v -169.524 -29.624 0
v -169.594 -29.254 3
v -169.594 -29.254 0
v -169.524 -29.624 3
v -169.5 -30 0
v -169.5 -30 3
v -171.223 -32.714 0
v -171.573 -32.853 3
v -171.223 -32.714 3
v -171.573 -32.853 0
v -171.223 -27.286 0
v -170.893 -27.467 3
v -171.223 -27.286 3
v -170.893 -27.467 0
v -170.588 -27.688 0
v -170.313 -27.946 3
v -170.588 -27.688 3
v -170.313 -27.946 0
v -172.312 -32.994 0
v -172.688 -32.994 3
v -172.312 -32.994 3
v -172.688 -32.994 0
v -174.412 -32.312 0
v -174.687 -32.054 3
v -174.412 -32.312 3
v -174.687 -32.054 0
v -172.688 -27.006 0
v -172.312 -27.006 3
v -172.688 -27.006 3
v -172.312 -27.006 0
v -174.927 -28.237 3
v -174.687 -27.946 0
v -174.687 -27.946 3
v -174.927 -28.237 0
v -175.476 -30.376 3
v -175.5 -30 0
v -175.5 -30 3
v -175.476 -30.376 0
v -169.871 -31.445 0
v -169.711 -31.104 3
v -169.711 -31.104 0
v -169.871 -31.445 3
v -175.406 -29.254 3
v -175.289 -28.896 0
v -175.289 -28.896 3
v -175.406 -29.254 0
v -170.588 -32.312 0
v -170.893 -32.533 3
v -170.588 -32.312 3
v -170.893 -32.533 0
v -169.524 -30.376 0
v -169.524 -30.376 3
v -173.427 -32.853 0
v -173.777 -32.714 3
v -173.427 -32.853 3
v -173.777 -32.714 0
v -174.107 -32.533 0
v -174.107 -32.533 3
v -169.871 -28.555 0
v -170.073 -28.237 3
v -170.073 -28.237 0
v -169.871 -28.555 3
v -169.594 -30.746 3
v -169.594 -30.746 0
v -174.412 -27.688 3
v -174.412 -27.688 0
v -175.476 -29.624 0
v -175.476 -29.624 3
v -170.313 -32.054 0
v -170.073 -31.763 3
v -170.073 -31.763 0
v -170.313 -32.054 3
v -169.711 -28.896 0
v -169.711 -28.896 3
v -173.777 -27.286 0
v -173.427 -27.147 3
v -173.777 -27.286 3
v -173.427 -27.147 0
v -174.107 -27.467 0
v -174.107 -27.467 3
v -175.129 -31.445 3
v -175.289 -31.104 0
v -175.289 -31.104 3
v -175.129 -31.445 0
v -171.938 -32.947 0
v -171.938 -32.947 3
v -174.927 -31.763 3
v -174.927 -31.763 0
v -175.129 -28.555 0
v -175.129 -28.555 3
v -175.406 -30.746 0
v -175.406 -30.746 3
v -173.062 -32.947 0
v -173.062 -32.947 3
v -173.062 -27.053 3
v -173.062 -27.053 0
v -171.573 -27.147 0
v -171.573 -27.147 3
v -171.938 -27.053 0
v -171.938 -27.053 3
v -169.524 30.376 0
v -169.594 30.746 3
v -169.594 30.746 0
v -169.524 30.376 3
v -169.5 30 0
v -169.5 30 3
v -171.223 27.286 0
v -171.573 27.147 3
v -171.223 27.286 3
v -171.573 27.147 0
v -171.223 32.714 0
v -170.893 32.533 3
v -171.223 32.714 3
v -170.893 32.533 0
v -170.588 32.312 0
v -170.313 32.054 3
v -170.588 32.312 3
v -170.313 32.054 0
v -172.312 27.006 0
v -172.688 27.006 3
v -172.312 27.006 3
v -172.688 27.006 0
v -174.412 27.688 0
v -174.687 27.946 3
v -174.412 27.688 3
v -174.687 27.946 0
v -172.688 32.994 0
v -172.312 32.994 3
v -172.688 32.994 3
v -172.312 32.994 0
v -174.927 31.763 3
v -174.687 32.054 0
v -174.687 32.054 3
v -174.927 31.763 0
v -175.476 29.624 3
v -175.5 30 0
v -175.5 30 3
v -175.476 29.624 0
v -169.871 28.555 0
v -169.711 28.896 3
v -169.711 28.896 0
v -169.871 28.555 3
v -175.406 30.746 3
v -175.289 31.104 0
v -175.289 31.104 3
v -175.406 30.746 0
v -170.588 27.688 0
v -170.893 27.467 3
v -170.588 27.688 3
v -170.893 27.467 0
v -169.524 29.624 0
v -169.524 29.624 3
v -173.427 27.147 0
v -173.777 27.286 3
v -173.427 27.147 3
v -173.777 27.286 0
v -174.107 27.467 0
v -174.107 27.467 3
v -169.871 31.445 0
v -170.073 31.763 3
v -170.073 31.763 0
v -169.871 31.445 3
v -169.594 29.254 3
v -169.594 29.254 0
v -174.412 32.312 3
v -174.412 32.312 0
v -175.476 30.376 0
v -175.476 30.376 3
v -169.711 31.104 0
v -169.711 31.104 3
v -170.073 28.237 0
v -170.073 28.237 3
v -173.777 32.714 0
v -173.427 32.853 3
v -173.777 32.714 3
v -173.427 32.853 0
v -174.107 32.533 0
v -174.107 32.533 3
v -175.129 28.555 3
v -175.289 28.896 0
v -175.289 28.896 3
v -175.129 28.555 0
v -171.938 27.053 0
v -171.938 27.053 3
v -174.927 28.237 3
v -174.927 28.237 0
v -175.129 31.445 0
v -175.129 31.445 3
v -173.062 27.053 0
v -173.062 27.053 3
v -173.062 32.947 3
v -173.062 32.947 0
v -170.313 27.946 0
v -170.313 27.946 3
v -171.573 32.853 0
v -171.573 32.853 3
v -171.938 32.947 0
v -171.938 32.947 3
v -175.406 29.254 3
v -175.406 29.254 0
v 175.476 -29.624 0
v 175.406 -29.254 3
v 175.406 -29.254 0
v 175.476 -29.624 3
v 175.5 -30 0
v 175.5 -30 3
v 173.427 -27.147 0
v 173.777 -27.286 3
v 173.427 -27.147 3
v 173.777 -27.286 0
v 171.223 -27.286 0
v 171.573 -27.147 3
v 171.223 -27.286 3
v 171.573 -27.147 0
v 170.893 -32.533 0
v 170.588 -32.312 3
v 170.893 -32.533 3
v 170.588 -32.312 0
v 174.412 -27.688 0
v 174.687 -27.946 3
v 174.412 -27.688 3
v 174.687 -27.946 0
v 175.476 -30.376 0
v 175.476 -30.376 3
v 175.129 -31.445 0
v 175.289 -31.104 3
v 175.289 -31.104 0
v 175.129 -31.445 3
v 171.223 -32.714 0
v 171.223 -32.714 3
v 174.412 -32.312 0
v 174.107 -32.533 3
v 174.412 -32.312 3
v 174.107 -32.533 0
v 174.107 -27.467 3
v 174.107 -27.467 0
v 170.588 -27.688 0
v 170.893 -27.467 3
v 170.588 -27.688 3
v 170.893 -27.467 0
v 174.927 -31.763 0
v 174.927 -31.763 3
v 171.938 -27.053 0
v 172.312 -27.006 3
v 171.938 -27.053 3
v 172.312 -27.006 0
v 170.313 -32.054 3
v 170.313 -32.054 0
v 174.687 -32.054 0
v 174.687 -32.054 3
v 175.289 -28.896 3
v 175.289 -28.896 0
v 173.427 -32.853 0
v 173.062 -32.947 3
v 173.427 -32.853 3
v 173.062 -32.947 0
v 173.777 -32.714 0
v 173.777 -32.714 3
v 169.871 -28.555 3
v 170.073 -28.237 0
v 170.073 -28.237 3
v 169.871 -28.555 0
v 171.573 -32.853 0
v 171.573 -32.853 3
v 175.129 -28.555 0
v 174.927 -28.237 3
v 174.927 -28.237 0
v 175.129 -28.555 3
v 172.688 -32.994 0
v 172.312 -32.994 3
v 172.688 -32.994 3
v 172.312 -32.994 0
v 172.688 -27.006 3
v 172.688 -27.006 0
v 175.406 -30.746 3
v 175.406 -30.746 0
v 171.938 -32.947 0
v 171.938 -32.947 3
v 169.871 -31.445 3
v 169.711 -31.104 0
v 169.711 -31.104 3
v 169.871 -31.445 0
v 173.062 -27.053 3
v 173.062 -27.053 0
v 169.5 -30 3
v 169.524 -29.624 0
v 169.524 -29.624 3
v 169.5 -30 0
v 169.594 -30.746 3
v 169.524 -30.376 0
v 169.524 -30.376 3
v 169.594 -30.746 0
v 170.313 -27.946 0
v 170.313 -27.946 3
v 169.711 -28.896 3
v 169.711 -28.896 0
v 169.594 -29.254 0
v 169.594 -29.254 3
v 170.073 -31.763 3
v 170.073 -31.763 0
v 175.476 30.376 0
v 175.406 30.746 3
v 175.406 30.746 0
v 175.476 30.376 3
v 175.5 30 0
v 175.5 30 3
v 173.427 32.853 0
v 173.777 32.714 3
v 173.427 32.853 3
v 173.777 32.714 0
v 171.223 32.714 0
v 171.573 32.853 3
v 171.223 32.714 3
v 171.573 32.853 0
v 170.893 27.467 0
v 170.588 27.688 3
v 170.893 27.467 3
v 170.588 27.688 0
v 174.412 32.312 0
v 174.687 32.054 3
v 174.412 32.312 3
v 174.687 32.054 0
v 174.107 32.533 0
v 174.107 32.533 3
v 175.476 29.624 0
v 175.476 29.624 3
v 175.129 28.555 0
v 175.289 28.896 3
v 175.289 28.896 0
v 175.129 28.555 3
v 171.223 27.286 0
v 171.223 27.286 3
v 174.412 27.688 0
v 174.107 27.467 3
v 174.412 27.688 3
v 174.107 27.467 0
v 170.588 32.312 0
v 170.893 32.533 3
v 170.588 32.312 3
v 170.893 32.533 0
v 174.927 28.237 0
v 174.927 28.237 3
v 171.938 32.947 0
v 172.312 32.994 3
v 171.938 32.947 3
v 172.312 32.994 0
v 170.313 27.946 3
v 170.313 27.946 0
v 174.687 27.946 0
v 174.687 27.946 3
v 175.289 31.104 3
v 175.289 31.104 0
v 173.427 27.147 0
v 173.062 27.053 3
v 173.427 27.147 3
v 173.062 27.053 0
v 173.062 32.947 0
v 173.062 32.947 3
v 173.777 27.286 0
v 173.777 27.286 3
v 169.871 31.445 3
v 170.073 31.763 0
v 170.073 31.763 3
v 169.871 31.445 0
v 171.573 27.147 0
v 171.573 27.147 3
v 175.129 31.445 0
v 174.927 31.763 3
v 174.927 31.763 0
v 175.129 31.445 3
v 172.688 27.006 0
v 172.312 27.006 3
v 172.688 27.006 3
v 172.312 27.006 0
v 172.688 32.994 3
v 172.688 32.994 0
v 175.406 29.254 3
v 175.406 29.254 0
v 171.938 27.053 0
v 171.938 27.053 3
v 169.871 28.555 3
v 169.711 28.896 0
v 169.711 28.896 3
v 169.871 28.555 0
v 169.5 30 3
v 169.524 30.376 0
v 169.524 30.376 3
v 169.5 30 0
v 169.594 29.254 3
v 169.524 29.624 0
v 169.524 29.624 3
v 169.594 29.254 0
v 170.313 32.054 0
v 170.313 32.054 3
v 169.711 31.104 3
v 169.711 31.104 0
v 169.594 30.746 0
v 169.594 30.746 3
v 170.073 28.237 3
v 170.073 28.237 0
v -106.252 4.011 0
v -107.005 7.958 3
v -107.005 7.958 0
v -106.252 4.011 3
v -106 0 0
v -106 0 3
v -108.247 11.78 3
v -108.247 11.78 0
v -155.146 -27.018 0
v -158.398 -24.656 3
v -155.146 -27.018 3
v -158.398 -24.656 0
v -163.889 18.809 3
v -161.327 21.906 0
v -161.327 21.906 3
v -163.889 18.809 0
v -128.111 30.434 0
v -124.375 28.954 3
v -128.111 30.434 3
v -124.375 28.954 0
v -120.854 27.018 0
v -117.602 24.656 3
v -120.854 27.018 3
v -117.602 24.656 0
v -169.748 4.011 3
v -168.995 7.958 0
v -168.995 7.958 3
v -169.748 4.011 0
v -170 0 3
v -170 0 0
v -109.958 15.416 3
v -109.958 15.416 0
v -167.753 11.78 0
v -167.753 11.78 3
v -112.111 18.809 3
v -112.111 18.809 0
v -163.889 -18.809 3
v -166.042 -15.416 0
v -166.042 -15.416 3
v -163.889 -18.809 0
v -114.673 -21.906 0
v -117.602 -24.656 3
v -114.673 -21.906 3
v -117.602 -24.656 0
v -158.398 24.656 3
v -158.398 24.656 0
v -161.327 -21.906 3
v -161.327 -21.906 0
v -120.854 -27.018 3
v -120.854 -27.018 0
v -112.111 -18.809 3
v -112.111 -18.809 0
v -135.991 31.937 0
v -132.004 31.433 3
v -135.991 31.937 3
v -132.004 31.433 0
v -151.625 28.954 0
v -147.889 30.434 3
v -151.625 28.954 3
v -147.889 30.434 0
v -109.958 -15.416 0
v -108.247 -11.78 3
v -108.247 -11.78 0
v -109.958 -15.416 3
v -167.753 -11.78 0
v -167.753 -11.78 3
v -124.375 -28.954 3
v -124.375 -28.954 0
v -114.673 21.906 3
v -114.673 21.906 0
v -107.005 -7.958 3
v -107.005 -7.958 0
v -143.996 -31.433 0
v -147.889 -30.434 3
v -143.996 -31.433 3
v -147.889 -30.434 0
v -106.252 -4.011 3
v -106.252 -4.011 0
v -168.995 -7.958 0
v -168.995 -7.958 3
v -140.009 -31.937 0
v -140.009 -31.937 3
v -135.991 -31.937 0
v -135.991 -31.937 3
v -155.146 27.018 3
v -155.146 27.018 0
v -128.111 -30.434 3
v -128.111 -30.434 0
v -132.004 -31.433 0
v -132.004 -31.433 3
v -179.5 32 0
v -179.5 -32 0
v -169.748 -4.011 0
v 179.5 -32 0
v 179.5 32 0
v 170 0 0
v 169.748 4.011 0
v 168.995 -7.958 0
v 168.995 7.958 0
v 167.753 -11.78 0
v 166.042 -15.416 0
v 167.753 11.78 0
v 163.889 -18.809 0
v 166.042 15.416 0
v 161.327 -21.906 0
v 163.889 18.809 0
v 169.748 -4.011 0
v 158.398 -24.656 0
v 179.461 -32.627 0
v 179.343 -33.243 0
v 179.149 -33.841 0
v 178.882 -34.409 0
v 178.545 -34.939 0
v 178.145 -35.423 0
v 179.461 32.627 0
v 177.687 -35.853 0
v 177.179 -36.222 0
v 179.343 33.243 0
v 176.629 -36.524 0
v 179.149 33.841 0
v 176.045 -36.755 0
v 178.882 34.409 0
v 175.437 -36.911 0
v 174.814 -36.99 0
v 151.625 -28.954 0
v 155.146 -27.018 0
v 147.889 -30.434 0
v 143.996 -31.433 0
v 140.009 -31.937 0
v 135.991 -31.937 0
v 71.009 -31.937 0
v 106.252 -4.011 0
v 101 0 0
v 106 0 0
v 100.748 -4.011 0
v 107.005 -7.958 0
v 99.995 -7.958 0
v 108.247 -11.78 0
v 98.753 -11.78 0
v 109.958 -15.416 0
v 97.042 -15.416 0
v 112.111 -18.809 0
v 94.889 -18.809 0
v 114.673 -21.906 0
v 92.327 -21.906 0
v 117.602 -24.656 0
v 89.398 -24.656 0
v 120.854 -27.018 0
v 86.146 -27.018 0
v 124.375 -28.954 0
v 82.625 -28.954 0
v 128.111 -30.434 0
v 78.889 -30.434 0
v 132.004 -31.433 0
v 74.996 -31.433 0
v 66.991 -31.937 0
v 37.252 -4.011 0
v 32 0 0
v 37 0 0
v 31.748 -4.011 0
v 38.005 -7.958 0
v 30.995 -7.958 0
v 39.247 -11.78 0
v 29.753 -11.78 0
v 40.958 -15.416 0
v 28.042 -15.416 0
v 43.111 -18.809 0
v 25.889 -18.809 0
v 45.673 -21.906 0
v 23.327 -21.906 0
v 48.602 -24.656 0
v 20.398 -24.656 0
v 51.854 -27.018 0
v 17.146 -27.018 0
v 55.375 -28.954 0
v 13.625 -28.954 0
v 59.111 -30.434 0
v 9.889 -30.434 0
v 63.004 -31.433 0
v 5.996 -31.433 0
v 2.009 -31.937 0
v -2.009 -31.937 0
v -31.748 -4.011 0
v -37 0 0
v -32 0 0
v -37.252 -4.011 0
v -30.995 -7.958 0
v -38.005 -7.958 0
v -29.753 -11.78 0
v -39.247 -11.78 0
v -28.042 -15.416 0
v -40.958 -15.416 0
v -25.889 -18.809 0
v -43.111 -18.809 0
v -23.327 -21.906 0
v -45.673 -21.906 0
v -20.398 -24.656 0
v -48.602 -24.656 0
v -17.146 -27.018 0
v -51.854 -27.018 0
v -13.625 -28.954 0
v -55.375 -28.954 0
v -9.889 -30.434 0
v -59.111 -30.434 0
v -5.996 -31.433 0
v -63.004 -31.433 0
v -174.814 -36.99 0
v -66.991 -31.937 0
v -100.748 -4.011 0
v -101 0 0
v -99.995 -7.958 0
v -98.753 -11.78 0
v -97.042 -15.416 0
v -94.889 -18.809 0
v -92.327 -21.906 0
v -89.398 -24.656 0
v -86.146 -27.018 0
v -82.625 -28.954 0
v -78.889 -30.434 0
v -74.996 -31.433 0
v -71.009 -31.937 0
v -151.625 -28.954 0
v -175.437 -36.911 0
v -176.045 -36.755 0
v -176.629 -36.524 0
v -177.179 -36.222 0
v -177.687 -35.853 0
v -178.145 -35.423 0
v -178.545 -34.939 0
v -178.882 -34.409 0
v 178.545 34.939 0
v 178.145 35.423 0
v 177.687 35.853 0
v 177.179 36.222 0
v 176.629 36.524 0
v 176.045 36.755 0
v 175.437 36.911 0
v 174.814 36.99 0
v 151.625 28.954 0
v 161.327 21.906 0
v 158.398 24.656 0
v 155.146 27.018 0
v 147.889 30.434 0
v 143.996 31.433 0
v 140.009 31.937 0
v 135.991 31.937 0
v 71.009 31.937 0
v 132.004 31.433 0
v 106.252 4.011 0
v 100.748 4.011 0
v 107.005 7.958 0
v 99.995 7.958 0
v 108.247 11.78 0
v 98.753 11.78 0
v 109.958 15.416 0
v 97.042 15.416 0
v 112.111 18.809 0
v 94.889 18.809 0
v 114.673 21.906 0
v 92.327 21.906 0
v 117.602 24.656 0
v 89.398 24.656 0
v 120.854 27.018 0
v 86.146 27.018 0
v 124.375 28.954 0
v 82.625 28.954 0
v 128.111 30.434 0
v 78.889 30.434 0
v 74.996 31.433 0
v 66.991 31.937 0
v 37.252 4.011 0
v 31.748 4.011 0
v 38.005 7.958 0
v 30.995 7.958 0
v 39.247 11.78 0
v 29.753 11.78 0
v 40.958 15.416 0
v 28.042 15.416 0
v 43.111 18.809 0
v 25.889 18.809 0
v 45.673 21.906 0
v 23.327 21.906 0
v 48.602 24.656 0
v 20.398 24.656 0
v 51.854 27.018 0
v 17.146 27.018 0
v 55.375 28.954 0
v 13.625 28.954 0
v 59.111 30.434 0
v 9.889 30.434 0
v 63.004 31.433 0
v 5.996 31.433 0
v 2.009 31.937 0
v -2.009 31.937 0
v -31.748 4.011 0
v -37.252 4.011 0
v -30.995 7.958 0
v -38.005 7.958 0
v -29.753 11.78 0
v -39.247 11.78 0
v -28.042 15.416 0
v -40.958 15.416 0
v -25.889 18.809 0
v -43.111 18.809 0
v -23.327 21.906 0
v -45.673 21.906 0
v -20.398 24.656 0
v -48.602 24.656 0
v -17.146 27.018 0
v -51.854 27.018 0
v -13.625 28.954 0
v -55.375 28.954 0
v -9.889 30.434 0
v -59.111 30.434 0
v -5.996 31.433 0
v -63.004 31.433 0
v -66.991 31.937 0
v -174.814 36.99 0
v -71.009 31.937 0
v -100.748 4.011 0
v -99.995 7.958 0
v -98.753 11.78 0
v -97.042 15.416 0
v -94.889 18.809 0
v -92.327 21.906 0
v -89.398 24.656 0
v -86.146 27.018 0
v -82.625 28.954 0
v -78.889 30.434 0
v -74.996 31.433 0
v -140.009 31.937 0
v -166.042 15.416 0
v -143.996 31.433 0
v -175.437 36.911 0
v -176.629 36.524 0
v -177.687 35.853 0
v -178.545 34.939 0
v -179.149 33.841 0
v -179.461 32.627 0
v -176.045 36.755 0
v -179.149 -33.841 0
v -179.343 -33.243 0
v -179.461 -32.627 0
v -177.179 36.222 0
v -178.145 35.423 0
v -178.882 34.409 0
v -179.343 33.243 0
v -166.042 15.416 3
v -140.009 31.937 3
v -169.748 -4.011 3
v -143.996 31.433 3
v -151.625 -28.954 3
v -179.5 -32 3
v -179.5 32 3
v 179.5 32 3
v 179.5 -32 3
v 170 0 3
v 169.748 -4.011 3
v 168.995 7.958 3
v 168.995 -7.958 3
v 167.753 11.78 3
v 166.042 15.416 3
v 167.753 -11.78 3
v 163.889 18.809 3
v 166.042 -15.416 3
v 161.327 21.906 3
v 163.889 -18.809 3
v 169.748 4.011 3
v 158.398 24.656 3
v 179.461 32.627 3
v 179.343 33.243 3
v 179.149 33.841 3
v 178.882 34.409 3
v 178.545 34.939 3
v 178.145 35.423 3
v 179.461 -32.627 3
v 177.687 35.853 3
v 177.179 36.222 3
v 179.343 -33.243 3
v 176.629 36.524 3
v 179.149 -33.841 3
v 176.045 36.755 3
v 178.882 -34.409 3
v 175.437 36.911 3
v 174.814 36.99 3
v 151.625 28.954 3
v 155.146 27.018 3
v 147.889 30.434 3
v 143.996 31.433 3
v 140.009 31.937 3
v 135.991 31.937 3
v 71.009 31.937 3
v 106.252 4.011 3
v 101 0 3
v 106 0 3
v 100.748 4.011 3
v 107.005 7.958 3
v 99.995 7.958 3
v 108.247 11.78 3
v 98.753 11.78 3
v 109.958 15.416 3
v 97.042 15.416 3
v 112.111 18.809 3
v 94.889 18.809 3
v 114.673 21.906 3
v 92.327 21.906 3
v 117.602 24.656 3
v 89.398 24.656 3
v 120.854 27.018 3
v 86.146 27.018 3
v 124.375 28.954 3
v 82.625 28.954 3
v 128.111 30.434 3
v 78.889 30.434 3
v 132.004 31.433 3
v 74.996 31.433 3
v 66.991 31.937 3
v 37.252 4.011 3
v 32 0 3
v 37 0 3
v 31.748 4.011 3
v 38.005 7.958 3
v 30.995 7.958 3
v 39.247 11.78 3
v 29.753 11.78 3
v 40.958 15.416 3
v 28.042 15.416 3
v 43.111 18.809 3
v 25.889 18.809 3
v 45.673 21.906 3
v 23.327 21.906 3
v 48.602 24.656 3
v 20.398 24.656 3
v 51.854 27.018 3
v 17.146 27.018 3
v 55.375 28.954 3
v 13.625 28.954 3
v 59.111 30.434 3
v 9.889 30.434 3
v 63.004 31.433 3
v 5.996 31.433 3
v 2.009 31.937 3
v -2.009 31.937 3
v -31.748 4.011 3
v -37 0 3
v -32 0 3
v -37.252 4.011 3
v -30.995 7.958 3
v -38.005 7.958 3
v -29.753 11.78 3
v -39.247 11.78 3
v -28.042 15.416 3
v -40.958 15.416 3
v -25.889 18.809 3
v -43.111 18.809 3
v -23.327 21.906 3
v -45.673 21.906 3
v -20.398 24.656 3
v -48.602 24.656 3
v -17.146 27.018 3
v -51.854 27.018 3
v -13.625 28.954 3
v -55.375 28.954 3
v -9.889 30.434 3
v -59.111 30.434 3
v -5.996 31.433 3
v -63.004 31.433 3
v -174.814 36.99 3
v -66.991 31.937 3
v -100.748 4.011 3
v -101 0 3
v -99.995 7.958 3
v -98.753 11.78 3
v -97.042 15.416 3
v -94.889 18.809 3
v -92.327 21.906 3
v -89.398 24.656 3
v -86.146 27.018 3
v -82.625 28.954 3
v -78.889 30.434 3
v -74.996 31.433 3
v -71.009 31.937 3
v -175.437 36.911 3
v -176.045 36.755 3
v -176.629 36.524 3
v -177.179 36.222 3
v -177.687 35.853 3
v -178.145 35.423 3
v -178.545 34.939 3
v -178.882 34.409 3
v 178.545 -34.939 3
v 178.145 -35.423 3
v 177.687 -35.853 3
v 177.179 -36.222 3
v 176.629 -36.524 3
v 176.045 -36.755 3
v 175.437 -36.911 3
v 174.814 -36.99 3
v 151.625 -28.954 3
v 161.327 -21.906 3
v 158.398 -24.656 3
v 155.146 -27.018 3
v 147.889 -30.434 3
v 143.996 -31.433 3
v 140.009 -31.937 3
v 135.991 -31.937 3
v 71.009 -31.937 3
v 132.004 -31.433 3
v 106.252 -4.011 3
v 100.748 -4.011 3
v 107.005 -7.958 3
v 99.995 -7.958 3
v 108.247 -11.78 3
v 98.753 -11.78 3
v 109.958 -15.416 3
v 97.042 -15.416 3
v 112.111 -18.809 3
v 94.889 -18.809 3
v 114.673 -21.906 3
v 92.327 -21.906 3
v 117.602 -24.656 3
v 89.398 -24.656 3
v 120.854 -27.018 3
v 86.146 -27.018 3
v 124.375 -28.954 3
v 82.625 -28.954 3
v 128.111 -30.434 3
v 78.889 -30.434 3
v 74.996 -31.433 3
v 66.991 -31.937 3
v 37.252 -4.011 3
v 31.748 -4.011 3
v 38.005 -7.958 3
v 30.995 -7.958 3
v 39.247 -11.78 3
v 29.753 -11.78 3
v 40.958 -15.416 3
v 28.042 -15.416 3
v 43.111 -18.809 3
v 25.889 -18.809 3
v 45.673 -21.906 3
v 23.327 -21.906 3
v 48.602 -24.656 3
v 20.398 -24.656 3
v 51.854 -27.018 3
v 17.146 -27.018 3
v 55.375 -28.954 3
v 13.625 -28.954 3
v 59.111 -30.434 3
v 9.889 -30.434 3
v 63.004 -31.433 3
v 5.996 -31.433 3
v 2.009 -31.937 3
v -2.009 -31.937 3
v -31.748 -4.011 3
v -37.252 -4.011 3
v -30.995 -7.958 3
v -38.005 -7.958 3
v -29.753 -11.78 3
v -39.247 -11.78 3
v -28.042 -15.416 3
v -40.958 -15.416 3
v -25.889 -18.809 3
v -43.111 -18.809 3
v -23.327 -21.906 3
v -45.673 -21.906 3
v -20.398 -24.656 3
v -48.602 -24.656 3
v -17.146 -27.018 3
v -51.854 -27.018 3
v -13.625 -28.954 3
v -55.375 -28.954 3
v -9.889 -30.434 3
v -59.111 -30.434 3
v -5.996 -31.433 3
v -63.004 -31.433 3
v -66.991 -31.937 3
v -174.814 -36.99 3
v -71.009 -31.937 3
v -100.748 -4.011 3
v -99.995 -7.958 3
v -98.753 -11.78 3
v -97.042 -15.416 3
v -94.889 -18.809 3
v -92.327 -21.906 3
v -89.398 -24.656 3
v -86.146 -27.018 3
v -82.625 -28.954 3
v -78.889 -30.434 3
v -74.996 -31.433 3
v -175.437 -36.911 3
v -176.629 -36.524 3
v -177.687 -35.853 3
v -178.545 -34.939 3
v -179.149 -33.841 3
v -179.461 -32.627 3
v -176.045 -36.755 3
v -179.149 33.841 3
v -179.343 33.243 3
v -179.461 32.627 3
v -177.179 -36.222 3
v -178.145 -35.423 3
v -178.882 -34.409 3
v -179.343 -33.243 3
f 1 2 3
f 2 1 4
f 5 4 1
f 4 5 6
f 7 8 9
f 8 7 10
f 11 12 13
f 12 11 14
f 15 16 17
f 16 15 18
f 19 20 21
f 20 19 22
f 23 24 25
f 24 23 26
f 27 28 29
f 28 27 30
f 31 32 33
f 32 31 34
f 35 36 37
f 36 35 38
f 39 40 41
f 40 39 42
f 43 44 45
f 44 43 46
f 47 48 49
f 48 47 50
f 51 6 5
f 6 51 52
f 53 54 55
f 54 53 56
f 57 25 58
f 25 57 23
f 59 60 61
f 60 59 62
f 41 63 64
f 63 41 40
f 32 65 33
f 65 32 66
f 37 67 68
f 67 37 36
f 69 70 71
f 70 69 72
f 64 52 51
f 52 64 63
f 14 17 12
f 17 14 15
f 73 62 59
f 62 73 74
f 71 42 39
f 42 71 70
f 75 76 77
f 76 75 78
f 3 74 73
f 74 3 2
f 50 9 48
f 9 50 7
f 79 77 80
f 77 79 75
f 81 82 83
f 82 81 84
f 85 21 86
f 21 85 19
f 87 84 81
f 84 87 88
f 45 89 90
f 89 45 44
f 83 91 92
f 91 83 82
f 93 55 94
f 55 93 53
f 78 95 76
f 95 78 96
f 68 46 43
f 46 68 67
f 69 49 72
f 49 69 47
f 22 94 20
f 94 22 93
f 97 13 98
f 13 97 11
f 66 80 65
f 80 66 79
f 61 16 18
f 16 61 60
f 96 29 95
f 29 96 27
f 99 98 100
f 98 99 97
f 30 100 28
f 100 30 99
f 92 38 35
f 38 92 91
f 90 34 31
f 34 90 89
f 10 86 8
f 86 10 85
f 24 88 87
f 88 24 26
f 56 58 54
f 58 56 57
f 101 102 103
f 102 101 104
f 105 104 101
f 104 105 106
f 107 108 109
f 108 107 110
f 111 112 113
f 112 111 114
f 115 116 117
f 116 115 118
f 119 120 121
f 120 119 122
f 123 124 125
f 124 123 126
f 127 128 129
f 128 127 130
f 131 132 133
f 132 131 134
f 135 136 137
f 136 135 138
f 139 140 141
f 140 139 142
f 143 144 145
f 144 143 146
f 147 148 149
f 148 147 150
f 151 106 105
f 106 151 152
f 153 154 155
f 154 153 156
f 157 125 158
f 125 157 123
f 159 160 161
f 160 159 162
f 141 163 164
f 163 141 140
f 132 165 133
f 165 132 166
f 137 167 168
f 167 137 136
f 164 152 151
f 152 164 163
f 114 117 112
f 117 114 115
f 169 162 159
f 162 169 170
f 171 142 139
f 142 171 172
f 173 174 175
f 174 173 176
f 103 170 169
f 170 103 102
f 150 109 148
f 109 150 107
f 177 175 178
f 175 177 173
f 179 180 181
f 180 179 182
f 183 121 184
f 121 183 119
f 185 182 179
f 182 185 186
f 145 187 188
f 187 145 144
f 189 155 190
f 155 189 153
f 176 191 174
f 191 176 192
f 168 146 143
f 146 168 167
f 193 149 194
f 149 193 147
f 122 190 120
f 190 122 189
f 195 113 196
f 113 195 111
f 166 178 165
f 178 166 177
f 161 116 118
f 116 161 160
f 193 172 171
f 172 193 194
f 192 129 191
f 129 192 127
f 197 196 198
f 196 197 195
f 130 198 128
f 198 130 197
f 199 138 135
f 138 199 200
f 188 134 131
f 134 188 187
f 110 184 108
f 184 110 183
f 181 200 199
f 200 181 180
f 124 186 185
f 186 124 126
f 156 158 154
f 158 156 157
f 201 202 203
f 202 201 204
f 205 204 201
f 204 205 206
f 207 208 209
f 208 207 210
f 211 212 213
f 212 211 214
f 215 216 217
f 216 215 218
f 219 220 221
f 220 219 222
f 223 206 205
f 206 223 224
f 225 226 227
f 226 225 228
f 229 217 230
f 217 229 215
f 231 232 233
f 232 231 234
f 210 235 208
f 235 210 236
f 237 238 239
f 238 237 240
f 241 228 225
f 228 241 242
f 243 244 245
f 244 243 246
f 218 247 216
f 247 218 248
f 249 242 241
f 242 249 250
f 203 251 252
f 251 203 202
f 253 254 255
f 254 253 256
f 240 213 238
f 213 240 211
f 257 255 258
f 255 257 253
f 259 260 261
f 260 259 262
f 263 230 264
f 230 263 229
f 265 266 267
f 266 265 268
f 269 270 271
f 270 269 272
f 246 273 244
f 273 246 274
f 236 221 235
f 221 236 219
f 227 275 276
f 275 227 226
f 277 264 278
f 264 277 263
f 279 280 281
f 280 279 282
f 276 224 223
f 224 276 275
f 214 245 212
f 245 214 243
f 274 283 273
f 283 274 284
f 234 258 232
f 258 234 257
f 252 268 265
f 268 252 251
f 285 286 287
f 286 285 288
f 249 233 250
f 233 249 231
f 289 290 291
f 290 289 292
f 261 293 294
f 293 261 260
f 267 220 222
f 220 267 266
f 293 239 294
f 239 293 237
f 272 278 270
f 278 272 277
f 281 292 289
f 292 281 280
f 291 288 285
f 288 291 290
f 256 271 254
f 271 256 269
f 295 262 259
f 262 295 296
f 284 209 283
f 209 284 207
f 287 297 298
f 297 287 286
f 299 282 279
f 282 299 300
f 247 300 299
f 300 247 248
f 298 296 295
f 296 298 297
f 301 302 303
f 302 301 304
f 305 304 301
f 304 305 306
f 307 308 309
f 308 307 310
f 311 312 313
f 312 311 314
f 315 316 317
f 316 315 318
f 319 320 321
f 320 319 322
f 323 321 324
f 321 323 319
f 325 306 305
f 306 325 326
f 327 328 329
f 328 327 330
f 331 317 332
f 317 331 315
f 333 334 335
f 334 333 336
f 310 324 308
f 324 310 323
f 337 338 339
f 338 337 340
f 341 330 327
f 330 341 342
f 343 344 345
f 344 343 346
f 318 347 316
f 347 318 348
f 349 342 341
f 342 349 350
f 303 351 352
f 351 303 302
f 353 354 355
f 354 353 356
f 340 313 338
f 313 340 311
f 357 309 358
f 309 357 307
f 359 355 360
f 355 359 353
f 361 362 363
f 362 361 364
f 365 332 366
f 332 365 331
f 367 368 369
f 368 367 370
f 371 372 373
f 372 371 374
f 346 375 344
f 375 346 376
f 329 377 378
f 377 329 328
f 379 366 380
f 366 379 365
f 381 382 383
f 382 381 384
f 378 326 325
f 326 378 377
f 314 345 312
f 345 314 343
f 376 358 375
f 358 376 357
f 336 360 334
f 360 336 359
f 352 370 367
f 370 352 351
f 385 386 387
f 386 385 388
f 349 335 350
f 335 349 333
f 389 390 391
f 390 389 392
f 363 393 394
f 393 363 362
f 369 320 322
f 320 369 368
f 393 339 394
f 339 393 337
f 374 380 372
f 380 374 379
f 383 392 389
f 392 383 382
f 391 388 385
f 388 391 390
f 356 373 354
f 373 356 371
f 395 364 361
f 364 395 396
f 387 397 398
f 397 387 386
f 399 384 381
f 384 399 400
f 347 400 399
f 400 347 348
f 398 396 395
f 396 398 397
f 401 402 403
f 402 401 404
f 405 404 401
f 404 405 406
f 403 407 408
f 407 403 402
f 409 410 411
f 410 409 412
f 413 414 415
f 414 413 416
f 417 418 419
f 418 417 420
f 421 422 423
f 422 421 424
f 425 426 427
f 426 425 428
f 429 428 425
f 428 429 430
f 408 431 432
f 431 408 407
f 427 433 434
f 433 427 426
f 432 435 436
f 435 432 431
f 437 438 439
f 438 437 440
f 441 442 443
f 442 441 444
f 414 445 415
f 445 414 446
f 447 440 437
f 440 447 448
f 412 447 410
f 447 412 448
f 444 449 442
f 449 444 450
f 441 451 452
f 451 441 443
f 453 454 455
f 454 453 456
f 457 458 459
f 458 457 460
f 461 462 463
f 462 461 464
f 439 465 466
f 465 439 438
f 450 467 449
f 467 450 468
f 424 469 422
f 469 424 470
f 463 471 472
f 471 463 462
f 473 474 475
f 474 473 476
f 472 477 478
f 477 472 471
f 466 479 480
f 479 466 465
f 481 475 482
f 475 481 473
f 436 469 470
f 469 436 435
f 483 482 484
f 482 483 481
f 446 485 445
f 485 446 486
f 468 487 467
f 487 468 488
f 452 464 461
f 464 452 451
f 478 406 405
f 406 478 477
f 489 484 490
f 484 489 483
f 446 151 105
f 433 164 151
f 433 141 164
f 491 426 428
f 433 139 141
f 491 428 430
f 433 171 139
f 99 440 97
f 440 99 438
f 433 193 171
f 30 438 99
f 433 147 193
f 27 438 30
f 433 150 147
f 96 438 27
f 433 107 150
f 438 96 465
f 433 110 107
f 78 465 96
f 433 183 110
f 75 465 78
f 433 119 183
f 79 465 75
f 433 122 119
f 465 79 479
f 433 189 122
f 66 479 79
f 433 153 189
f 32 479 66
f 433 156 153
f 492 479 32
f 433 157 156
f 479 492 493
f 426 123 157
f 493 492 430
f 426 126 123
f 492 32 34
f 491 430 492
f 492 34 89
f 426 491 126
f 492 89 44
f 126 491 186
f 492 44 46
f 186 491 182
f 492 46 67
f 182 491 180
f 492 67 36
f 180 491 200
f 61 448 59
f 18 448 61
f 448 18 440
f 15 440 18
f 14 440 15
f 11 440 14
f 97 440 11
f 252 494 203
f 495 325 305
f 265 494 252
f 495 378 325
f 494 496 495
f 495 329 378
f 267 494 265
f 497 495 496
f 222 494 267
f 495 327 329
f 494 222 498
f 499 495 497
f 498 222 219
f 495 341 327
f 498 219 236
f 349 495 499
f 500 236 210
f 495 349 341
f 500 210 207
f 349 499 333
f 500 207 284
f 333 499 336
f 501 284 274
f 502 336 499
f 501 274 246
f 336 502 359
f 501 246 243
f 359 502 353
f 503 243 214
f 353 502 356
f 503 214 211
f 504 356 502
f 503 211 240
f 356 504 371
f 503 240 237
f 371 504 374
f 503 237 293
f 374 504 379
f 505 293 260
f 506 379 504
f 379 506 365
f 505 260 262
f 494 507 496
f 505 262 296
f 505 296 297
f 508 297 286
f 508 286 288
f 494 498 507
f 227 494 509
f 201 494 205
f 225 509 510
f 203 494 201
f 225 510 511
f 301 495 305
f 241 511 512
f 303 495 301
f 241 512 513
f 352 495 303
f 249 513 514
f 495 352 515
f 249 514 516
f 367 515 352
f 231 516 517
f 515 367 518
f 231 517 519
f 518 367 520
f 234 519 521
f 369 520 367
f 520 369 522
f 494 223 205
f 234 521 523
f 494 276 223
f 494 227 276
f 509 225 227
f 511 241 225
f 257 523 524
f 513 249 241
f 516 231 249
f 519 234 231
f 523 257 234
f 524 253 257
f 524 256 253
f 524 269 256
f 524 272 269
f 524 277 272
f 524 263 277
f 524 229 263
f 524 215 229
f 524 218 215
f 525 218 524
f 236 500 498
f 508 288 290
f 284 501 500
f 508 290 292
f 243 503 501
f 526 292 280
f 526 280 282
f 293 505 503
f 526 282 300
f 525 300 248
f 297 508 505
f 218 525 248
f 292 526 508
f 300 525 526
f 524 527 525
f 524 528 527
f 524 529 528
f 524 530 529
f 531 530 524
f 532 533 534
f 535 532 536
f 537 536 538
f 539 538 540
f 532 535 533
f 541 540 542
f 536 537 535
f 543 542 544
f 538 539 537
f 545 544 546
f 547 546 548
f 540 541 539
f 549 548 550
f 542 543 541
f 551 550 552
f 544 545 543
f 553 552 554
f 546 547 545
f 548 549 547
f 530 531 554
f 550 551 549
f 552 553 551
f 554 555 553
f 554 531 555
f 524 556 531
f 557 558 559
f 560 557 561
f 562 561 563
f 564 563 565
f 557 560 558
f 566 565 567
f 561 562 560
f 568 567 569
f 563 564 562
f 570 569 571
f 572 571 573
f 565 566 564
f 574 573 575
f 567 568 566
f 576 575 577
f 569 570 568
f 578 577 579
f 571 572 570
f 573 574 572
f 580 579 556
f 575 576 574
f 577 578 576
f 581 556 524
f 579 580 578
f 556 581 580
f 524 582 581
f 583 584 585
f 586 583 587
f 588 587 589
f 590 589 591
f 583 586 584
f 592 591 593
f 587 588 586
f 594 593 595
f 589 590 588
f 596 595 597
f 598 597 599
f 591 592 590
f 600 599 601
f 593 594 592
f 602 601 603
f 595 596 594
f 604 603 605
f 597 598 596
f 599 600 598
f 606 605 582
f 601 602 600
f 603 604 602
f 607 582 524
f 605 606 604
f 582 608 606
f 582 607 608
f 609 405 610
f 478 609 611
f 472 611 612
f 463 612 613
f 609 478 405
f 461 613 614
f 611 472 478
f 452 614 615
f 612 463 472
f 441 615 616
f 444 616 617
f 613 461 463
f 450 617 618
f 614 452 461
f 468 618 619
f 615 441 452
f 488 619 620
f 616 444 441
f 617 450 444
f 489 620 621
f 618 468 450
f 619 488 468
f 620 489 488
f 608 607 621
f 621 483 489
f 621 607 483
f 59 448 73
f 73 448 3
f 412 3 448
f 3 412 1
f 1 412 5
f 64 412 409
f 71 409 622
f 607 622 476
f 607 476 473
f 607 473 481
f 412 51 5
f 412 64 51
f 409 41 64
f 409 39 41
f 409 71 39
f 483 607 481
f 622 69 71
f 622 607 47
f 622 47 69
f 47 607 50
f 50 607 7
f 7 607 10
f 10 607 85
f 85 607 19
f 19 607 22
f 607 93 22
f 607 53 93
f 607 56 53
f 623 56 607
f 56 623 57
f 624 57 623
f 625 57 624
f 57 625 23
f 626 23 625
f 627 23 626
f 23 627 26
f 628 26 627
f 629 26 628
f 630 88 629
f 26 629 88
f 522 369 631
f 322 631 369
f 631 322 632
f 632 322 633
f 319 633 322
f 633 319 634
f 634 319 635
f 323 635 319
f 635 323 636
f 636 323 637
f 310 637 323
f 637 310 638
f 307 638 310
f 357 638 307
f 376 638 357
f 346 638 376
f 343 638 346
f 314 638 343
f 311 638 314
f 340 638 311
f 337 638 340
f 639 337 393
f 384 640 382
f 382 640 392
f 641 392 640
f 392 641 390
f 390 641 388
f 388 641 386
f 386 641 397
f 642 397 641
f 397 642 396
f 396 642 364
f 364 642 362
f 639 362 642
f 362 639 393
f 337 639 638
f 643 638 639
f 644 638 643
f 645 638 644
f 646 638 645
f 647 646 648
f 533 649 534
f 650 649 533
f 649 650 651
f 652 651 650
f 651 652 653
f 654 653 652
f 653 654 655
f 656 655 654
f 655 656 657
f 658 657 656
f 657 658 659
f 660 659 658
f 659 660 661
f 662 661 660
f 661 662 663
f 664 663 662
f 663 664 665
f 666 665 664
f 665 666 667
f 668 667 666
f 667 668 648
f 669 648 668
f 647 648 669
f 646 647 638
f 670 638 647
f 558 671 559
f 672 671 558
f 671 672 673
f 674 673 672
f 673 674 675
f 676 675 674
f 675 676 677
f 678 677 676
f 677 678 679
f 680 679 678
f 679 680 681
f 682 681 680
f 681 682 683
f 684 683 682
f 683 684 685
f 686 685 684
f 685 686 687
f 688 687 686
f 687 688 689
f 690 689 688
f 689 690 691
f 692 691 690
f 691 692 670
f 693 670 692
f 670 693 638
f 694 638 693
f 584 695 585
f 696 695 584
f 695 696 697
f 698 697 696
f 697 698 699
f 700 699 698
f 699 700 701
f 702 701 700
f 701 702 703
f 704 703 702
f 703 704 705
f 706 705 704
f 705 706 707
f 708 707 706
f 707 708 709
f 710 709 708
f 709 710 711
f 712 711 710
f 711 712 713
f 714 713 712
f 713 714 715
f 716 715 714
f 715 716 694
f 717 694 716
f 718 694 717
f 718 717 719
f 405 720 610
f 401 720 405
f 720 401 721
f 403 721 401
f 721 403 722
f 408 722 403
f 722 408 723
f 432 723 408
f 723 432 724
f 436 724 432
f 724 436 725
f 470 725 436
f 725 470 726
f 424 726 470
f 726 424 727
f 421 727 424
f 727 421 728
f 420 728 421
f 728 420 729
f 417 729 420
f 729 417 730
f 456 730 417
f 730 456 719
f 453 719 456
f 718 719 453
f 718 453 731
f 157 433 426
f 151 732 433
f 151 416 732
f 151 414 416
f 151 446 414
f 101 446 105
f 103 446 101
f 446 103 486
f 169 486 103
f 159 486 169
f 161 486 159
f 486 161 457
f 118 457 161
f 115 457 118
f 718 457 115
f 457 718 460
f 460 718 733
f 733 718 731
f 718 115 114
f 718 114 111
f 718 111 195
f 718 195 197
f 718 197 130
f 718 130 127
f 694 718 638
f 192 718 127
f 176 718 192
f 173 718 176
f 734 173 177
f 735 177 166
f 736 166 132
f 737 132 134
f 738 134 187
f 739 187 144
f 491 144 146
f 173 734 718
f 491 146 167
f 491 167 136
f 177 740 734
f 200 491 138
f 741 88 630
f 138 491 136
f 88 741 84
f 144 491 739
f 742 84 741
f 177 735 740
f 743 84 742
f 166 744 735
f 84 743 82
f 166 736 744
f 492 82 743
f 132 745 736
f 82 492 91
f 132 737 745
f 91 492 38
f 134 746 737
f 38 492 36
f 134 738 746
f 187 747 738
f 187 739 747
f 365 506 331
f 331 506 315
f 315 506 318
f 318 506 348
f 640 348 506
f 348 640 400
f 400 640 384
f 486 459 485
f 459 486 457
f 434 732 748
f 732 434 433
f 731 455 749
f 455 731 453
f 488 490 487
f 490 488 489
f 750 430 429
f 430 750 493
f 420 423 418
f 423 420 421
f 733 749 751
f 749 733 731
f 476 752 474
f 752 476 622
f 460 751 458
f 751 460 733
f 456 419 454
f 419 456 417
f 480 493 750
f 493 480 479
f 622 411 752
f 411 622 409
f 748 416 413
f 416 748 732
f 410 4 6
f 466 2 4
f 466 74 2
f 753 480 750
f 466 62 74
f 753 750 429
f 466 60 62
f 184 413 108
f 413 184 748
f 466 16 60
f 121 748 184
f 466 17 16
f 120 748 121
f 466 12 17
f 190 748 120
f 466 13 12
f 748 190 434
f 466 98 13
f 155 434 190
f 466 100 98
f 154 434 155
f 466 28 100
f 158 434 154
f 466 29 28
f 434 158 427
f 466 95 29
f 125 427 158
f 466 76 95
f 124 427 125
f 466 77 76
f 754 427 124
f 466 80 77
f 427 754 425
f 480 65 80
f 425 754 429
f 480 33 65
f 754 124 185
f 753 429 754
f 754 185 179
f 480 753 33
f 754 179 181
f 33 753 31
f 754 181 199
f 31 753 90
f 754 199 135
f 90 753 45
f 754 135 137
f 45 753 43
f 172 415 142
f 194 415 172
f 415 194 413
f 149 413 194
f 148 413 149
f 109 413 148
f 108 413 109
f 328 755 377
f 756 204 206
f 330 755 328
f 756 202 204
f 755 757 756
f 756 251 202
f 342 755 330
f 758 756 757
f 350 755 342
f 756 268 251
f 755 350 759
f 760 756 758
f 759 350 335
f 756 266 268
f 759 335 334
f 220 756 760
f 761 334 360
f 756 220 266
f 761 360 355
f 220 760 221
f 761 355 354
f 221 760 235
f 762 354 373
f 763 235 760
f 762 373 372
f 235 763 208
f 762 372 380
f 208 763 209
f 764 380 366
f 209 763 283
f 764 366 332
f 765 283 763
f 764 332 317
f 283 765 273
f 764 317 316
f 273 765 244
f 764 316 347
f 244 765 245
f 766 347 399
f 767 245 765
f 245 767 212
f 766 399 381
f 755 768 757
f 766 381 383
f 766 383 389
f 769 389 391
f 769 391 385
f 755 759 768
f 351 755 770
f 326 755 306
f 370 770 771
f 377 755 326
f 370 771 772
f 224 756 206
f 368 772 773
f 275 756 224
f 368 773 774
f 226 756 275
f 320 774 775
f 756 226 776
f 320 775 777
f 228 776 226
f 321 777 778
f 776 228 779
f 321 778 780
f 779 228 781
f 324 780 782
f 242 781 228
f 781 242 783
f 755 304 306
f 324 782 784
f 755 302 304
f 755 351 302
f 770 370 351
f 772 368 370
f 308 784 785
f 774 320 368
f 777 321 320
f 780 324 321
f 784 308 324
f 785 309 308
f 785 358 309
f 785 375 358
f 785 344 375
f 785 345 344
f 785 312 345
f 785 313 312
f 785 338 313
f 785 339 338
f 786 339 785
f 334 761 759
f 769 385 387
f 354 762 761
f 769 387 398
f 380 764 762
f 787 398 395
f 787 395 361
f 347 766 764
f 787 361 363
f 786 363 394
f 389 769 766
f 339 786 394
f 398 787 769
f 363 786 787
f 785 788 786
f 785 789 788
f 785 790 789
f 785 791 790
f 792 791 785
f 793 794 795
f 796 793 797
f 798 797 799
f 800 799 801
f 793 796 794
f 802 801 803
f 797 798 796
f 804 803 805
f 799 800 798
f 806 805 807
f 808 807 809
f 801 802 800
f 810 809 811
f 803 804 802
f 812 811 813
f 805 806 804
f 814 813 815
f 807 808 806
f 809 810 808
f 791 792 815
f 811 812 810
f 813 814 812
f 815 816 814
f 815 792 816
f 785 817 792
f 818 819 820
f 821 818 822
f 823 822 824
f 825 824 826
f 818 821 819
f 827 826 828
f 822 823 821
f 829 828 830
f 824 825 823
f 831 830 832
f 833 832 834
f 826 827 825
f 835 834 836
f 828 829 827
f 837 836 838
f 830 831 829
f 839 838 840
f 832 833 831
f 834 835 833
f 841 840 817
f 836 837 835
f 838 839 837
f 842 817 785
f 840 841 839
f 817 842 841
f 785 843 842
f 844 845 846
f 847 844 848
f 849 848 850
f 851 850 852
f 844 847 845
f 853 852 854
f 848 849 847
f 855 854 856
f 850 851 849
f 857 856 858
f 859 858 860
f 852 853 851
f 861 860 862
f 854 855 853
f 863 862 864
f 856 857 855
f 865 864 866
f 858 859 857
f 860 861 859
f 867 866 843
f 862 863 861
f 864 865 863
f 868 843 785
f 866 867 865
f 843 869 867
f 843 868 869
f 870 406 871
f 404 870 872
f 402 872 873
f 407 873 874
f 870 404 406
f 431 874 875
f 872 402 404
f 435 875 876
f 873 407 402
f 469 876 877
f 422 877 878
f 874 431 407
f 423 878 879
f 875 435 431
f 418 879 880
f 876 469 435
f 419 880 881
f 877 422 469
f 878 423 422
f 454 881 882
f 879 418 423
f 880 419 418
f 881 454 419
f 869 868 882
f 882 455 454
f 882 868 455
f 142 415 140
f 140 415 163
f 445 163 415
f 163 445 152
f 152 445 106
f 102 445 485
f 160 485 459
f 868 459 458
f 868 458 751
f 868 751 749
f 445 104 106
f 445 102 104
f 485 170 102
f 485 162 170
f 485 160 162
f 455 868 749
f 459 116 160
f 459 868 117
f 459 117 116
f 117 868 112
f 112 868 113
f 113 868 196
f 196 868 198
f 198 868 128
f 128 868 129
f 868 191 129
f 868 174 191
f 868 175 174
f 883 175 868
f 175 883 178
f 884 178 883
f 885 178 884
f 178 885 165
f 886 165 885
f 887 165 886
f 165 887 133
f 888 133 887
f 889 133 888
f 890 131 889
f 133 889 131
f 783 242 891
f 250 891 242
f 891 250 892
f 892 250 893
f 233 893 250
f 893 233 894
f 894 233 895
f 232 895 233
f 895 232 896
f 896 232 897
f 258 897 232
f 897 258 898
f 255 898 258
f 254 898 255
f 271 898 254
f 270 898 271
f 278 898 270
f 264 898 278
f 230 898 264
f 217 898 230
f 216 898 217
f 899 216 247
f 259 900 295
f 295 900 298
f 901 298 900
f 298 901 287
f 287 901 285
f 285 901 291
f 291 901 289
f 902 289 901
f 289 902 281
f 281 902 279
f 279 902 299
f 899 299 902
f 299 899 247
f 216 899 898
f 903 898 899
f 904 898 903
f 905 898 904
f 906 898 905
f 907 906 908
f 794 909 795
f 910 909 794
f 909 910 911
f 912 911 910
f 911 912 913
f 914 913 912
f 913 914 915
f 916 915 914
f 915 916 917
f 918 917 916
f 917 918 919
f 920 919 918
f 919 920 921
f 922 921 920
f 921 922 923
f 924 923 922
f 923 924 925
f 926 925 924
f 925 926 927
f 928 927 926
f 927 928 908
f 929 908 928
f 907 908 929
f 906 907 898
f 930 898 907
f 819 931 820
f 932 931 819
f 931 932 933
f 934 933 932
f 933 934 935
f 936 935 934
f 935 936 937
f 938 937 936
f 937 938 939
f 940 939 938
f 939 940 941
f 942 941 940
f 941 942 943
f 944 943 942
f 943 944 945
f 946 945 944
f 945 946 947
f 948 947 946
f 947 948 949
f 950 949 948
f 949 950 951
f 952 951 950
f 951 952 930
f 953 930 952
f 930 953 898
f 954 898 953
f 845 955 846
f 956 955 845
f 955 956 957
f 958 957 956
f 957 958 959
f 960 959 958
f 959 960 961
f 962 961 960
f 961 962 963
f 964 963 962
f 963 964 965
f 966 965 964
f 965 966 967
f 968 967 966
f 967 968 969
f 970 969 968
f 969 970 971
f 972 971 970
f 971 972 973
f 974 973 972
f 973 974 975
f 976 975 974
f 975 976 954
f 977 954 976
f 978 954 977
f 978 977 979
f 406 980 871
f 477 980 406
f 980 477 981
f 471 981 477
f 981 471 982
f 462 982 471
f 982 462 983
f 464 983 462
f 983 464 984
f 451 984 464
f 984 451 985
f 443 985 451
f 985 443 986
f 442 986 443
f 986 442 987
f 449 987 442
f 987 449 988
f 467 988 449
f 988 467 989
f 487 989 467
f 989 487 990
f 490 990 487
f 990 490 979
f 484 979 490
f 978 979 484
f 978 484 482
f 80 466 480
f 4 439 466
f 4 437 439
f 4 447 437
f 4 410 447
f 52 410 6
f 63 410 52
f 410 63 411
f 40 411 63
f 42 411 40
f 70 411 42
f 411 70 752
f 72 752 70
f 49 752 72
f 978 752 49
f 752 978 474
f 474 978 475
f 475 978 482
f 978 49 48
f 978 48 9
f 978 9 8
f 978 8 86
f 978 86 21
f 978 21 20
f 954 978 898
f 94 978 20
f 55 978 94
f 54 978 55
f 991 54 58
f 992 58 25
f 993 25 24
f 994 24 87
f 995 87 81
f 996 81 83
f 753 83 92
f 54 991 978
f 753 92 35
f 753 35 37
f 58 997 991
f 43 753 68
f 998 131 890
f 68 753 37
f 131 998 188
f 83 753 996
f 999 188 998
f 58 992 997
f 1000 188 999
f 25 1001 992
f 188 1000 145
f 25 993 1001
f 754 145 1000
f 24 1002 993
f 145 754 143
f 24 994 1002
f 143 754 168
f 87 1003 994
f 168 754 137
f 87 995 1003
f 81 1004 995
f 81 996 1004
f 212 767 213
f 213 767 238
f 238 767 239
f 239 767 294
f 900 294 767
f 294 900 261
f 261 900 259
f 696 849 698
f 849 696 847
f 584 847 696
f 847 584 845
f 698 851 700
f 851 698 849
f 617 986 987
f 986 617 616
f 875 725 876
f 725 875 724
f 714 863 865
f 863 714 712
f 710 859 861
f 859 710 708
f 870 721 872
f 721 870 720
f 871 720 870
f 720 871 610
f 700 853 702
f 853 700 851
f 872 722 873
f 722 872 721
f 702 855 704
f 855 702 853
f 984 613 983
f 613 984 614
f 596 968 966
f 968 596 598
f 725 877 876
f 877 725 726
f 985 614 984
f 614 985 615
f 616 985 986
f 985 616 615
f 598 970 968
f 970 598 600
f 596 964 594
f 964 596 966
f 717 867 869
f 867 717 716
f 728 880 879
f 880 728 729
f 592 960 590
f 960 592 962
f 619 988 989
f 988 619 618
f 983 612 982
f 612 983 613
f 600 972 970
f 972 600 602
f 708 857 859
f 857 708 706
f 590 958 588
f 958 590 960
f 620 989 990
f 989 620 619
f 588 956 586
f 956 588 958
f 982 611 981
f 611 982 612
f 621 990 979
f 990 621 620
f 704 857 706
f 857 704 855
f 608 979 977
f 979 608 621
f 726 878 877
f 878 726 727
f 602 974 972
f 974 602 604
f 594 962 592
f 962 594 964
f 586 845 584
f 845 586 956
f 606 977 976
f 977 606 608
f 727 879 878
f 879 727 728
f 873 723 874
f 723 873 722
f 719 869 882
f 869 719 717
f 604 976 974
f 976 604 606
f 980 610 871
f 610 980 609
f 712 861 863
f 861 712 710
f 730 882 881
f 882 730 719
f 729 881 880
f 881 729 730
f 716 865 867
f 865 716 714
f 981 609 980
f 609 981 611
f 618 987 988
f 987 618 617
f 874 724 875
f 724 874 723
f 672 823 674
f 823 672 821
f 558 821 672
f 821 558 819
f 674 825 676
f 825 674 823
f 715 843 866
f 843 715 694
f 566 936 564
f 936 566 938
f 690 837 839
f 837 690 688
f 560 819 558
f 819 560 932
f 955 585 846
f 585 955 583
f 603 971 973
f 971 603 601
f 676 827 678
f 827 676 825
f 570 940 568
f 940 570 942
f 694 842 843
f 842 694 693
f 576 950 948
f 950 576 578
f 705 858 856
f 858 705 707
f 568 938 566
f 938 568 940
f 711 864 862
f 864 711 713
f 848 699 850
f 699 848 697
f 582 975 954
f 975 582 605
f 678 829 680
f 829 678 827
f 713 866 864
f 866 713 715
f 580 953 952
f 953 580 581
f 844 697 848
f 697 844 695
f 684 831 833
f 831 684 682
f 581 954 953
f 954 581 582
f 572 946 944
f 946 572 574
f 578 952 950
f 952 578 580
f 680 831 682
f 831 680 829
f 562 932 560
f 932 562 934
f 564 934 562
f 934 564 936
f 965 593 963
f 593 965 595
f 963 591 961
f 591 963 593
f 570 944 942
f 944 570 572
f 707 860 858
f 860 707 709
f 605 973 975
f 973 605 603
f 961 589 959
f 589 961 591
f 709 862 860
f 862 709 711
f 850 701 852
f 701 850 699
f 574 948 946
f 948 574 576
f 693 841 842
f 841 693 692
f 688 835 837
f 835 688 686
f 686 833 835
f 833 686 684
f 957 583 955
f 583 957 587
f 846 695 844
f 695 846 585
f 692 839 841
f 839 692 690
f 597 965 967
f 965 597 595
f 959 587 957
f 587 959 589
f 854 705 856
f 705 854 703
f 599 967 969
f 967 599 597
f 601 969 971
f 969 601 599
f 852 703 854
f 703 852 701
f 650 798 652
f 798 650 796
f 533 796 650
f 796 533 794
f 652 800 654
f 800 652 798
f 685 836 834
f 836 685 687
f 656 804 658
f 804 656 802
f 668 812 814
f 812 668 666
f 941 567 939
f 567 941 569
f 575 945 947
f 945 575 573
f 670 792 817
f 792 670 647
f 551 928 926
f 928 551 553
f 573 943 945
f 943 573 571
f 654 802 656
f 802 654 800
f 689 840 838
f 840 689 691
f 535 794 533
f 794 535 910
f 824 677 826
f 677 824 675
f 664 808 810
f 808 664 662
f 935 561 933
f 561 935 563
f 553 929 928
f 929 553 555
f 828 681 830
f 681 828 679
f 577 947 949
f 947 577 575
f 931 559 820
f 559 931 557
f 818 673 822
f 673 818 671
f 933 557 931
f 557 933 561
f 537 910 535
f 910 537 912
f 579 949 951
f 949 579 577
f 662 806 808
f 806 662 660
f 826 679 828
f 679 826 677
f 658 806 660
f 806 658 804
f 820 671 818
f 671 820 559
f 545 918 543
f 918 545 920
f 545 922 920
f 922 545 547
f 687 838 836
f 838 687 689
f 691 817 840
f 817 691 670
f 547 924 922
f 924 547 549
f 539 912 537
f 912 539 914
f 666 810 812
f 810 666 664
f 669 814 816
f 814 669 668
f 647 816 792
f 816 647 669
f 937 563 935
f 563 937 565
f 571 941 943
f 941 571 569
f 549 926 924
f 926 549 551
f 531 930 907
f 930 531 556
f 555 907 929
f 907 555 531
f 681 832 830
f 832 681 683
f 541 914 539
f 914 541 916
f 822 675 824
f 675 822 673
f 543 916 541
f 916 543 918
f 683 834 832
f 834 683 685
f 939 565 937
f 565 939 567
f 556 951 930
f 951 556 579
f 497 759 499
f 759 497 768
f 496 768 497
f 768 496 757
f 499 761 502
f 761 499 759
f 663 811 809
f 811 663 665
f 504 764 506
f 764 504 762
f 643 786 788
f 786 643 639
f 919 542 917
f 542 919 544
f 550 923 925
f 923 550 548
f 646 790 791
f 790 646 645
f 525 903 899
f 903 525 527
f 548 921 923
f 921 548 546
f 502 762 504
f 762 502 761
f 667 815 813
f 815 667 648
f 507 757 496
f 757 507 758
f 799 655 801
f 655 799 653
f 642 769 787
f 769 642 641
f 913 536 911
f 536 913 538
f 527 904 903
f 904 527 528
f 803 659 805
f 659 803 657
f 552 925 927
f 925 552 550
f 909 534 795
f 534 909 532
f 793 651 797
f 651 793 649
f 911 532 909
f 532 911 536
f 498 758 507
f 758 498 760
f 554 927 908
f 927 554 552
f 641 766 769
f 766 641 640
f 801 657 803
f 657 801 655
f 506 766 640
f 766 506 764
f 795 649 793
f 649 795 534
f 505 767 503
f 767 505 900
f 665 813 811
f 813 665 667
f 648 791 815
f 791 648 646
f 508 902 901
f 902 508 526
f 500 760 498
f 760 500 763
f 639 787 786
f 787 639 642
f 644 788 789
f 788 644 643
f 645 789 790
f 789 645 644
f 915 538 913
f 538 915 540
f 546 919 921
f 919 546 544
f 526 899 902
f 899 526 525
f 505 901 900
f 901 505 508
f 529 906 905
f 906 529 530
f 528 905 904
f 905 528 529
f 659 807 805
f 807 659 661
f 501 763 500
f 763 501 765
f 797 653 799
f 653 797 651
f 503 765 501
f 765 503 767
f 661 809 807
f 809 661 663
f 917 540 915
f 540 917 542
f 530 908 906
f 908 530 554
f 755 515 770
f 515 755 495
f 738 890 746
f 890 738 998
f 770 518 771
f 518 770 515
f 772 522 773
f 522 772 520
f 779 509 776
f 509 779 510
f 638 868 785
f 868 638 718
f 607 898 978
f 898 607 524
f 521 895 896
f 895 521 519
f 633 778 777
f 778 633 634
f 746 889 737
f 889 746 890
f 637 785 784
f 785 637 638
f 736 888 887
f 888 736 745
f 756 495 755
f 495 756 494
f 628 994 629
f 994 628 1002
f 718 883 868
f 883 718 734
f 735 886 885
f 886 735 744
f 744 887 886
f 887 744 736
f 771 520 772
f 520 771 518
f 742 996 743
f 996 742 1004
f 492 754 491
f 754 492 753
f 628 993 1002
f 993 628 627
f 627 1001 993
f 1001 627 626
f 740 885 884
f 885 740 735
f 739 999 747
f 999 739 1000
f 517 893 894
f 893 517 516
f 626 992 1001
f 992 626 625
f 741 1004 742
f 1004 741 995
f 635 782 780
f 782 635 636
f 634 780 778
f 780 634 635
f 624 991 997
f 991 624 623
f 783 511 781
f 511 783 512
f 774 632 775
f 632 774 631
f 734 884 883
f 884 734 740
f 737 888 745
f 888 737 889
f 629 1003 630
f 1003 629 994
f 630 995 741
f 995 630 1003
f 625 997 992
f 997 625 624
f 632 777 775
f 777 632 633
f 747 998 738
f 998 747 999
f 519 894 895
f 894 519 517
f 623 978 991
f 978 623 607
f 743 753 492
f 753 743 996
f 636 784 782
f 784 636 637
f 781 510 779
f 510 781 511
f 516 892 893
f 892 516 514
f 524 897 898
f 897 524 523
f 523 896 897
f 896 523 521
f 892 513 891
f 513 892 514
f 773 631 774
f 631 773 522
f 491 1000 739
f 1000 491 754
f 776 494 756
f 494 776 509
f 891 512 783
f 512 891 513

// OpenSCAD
$fn = 50;


difference() {
	union() {
		hull() {
			translate(v = [-174.5000000000, 32.0000000000, 0]) {
				cylinder(h = 3, r = 5);
			}
			translate(v = [174.5000000000, 32.0000000000, 0]) {
				cylinder(h = 3, r = 5);
			}
			translate(v = [-174.5000000000, -32.0000000000, 0]) {
				cylinder(h = 3, r = 5);
			}
			translate(v = [174.5000000000, -32.0000000000, 0]) {
				cylinder(h = 3, r = 5);
			}
		}
	}
	union() {
		#translate(v = [-172.5000000000, -30.0000000000, -100.0000000000]) {
			cylinder(h = 200, r = 3.0000000000);
		}
		#translate(v = [-172.5000000000, 30.0000000000, -100.0000000000]) {
			cylinder(h = 200, r = 3.0000000000);
		}
		#translate(v = [172.5000000000, -30.0000000000, -100.0000000000]) {
			cylinder(h = 200, r = 3.0000000000);
		}
		#translate(v = [172.5000000000, 30.0000000000, -100.0000000000]) {
			cylinder(h = 200, r = 3.0000000000);
		}
		#translate(v = [-138.0000000000, 0, 0]) {
			cylinder(h = 3, r = 32.0000000000);
		}
		#translate(v = [-69.0000000000, 0, 0]) {
			cylinder(h = 3, r = 32.0000000000);
		}
		#cylinder(h = 3, r = 32.0000000000);
		#translate(v = [69.0000000000, 0, 0]) {
			cylinder(h = 3, r = 32.0000000000);
		}
		#translate(v = [138.0000000000, 0, 0]) {
			cylinder(h = 3, r = 32.0000000000);
		}
	}
}
